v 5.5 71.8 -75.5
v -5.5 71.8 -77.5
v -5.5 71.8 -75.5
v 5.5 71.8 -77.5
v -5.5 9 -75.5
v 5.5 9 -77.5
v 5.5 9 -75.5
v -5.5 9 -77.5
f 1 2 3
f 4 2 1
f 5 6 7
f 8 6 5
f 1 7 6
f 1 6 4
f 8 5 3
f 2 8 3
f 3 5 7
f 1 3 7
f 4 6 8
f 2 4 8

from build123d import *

# Parameters (mm, degrees)
SKETCH1_W                       = 39
SKETCH1_H                       = 155
BOSS_EXTRUDE1_DEPTH             = 2
BOSS_EXTRUDE2_DEPTH             = 78
SKETCH3_W                       = 2
SKETCH3_H                       = 2
BOSS_EXTRUDE3_DEPTH             = 78
SKETCH4_W                       = 2
SKETCH4_H                       = 2
BOSS_EXTRUDE4_DEPTH             = 151
SKETCH6_W                       = 35
SKETCH6_H                       = 2.2
CUT_EXTRUDE1_DEPTH              = 174.750539568
SKETCH7_W                       = 35
SKETCH7_H                       = 2.2
CUT_EXTRUDE2_DEPTH              = 112.671392935
SKETCH5_W                       = 31
SKETCH5_H                       = 2
BOSS_EXTRUDE5_DEPTH             = 2
BOSS_EXTRUDE6_REACH             = 115.077
SKETCH8_W                       = 2
SKETCH8_H                       = 2
BOSS_EXTRUDE6_DIRECTION_2_REACH = 115.077
SKETCH10_W                      = 2
SKETCH10_H                      = 2.2
SKETCH10_W_2                    = 2.2
SKETCH10_H_2                    = 2
BOSS_EXTRUDE8_DEPTH             = 2
SKETCH11_W                      = 2
SKETCH11_H                      = 2.2
SKETCH11_W_2                    = 2.2
SKETCH11_H_2                    = 2
BOSS_EXTRUDE9_DEPTH             = 2
FILLET2_R                       = 2.5
SKETCH14_W                      = 36.5
SKETCH14_H                      = 7.75
BOSS_EXTRUDE10_DEPTH            = 2
SKETCH13_W                      = 31
SKETCH13_H                      = 3
CUT_EXTRUDE4_DEPTH              = 2
FILLET3_R                       = 2
FILLET4_R                       = 0.5
SKETCH15_R                      = 5.1
CUT_EXTRUDE5_DEPTH              = 114.077407116
SKETCH16_R                      = 7.1
BOSS_EXTRUDE11_DEPTH            = 1
FILLET5_R                       = 0.5
FILLET7_R                       = 0.5
CUT_EXTRUDE7_DEPTH              = 114.077407116
CUT_EXTRUDE7_DEPTH_BACK         = 114.077407116
SKETCH18_W                      = 9
SKETCH18_H                      = 71
CUT_EXTRUDE8_DEPTH              = 113.323194399
CUT_EXTRUDE9_DEPTH              = 81.213776872
CUT_EXTRUDE9_DEPTH_BACK         = 81.213776872
SKETCH19_W                      = 11
SKETCH19_H                      = 8.2


with BuildPart() as part:
    # Sketch1 → Boss-Extrude1 (new body)
    with BuildSketch(Plane(origin=(0, 0, 0), x_dir=(1, 0, 0), z_dir=(0, 1, 0))):
        Rectangle(SKETCH1_W, SKETCH1_H)
    extrude(amount=BOSS_EXTRUDE1_DEPTH)

    # Sketch2 → Boss-Extrude2 (add)
    with BuildSketch(Plane(origin=(0, 2, 0), x_dir=(1, 0, 0), z_dir=(0, 1, 0))):
        Polygon((-17.5, -77.5), (-17.5, -75.5), (-17.5, 75.5), (17.5, 75.5), (17.5, -75.5), (17.5, -77.5), (19.5, -77.5), (19.5, 77.5), (-19.5, 77.5), (-19.5, -77.5), align=None)
    extrude(amount=BOSS_EXTRUDE2_DEPTH)

    # Sketch3 → Boss-Extrude3 (add)
    with BuildSketch(Plane(origin=(0, 2, 0), x_dir=(1, 0, 0), z_dir=(0, 1, 0))):
        with Locations((-16.5, -76.5)):
            Rectangle(SKETCH3_W, SKETCH3_H)
        with Locations((-16.5, -72.3)):
            Rectangle(SKETCH3_W, SKETCH3_H)
        with Locations((16.5, -76.5)):
            Rectangle(SKETCH3_W, SKETCH3_H)
        with Locations((16.5, -72.3)):
            Rectangle(SKETCH3_W, SKETCH3_H)
    extrude(amount=BOSS_EXTRUDE3_DEPTH)

    # Sketch4 → Boss-Extrude4 (add)
    with BuildSketch(Plane.XY.offset(-75.5)):
        with Locations((-16.5, 79)):
            Rectangle(SKETCH4_W, SKETCH4_H)
        Polygon((-15.5, 73.8), (-17.5, 71.8), (-17.5, 75.8), (-15.5, 75.8), align=None)
        Polygon((15.5, 75.8), (17.5, 75.8), (17.5, 71.8), (15.5, 73.8), align=None)
        with Locations((16.5, 79)):
            Rectangle(SKETCH4_W, SKETCH4_H)
    extrude(amount=BOSS_EXTRUDE4_DEPTH)

    # Sketch6 → Cut-Extrude1 (cut, through all)
    with BuildSketch(Plane.XY.offset(-75.5)):
        with Locations((0, 76.9)):
            Rectangle(SKETCH6_W, SKETCH6_H)
    extrude(amount=CUT_EXTRUDE1_DEPTH, mode=Mode.SUBTRACT)

    # Sketch7 → Cut-Extrude2 (cut, through all)
    with BuildSketch(Plane(origin=(0, 2, 0), x_dir=(1, 0, 0), z_dir=(0, 1, 0))):
        with Locations((0, -74.4)):
            Rectangle(SKETCH7_W, SKETCH7_H)
    extrude(amount=CUT_EXTRUDE2_DEPTH, mode=Mode.SUBTRACT)

    # Sketch5 → Boss-Extrude5 (add)
    with BuildSketch(Plane(origin=(0, 2, 0), x_dir=(1, 0, 0), z_dir=(0, 1, 0))):
        with Locations((0, -76.5)):
            Rectangle(SKETCH5_W, SKETCH5_H)
        with Locations((0, -72.3)):
            Rectangle(SKETCH5_W, SKETCH5_H)
    extrude(amount=BOSS_EXTRUDE5_DEPTH)

    # Boss-Extrude6: up to this face of the body (flat: up to its plane)
    boss_extrude6_end = Plane(part.part.faces().sort_by_distance((17.5, 36.9, -2.1))[0])
    # Sketch8 → Boss-Extrude6 (add, up to the picked face)
    with BuildSketch(Plane(origin=(0, 0, 0), x_dir=(0, 0, -1), z_dir=(1, 0, 0)), mode=Mode.PRIVATE) as boss_extrude6_sk1:
        with Locations((74.5, 79)):
            Rectangle(SKETCH8_W, SKETCH8_H)
    boss_extrude6_tool1 = split(extrude(boss_extrude6_sk1.sketch, amount=BOSS_EXTRUDE6_REACH, mode=Mode.PRIVATE), bisect_by=boss_extrude6_end, keep=Keep.BOTH, mode=Mode.PRIVATE)
    # Sketch8 → Boss-Extrude6 (add, up to the picked face)
    with BuildSketch(Plane(origin=(0, 0, 0), x_dir=(0, 0, -1), z_dir=(1, 0, 0)), mode=Mode.PRIVATE) as boss_extrude6_sk2:
        Polygon((75.5, 75.8), (73.5, 75.8), (73.5, 73.8), (75.5, 71.8), align=None)
    boss_extrude6_tool2 = split(extrude(boss_extrude6_sk2.sketch, amount=BOSS_EXTRUDE6_REACH, mode=Mode.PRIVATE), bisect_by=boss_extrude6_end, keep=Keep.BOTH, mode=Mode.PRIVATE)
    add(boss_extrude6_tool1.solids().sort_by(Axis((0, 79, -74.5), (1, 0, 0)))[0])
    add(boss_extrude6_tool2.solids().sort_by(Axis((0, 74.244444, -74.611111), (1, 0, 0)))[0])

    # Boss-Extrude6 direction 2: up to this face of the body (flat: up to its plane)
    boss_extrude6_direction_2_end = Plane(part.part.faces().sort_by_distance((-17.5, 36.9, -2.1))[0])
    # Sketch8 → Boss-Extrude6 direction 2 (add, up to the picked face)
    with BuildSketch(Plane(origin=(0, 0, 0), x_dir=(0, 0, -1), z_dir=(1, 0, 0)), mode=Mode.PRIVATE) as boss_extrude6_direction_2_sk1:
        with Locations((74.5, 79)):
            Rectangle(SKETCH8_W, SKETCH8_H)
    boss_extrude6_direction_2_tool1 = split(extrude(boss_extrude6_direction_2_sk1.sketch, amount=-BOSS_EXTRUDE6_DIRECTION_2_REACH, mode=Mode.PRIVATE), bisect_by=boss_extrude6_direction_2_end, keep=Keep.BOTH, mode=Mode.PRIVATE)
    # Sketch8 → Boss-Extrude6 direction 2 (add, up to the picked face)
    with BuildSketch(Plane(origin=(0, 0, 0), x_dir=(0, 0, -1), z_dir=(1, 0, 0)), mode=Mode.PRIVATE) as boss_extrude6_direction_2_sk2:
        Polygon((75.5, 75.8), (73.5, 75.8), (73.5, 73.8), (75.5, 71.8), align=None)
    boss_extrude6_direction_2_tool2 = split(extrude(boss_extrude6_direction_2_sk2.sketch, amount=-BOSS_EXTRUDE6_DIRECTION_2_REACH, mode=Mode.PRIVATE), bisect_by=boss_extrude6_direction_2_end, keep=Keep.BOTH, mode=Mode.PRIVATE)
    add(boss_extrude6_direction_2_tool1.solids().sort_by(Axis((0, 79, -74.5), (-1, 0, 0)))[0])
    add(boss_extrude6_direction_2_tool2.solids().sort_by(Axis((0, 74.244444, -74.611111), (-1, 0, 0)))[0])

    # Sketch10 → Boss-Extrude8 (add)
    with BuildSketch(Plane(origin=(-17.5, 0, 0), x_dir=(0, 0, -1), z_dir=(1, 0, 0))):
        with Locations((-76.5, 76.9)):
            Rectangle(SKETCH10_W, SKETCH10_H)
        with Locations((-74.4, 79)):
            Rectangle(SKETCH10_W_2, SKETCH10_H_2)
    extrude(amount=BOSS_EXTRUDE8_DEPTH)

    # Sketch11 → Boss-Extrude9 (add)
    with BuildSketch(Plane.ZY.offset(-17.5)):
        with Locations((76.5, 76.9)):
            Rectangle(SKETCH11_W, SKETCH11_H)
        with Locations((74.4, 79)):
            Rectangle(SKETCH11_W_2, SKETCH11_H_2)
    extrude(amount=BOSS_EXTRUDE9_DEPTH)

    # Fillet2
    fillet2_edges = [part.edges().sort_by_distance(p)[0] for p in [
        (-17.5, 36.9, 71.3),
        (17.5, 36.9, 71.3),
        (19.5, 40, 77.5),
        (-19.5, 40, 77.5),
        (-19.5, 40, -77.5),
        (-17.5, 36.9, -75.5),
        (17.5, 36.9, -75.5),
        (19.5, 40, -77.5),
        (19.5, 80, 0),
        (-19.5, 80, 0),
        (19.5, 0, 0),
        (-19.5, 0, 0),
        (0, 80, -77.5),
        (0, 0, 77.5),
        (0, 0, -77.5),
        (-17.5, 80, 77.5),
        (17.5, 80, 77.5),
    ]]
    fillet(fillet2_edges, radius=FILLET2_R)

    # Sketch14 → Boss-Extrude10 (add)
    with BuildSketch(Plane.XY.offset(-75.5)):
        with Locations((0, 5.125)):
            Rectangle(SKETCH14_W, SKETCH14_H)
    extrude(amount=BOSS_EXTRUDE10_DEPTH)

    # Sketch13 → Cut-Extrude4 (cut)
    with BuildSketch(Plane(origin=(0, 0, -77.5), x_dir=(-1, 0, 0), z_dir=(0, 0, -1))):
        with Locations((0, 5.5)):
            Rectangle(SKETCH13_W, SKETCH13_H)
    extrude(amount=-CUT_EXTRUDE4_DEPTH, mode=Mode.SUBTRACT)

    # Fillet3
    fillet3_edges = [part.edges().sort_by_distance(p)[0] for p in [
        (0, 9, -73.5),
    ]]
    fillet(fillet3_edges, radius=FILLET3_R - 0.0001)  # a hair under: the kernel refuses the full size

    # Fillet4
    fillet4_edges = [part.edges().sort_by_distance(p)[0] for p in [
        (15.5, 5.5, -75.5),
        (15.5, 4, -76.5),
        (0, 7, -75.5),
        (15.5, 7, -76.5),
        (-15.5, 5.5, -75.5),
        (-15.5, 7, -76.5),
        (0, 4, -75.5),
        (-15.5, 4, -76.5),
        (15.5, 5.5, -77.5),
        (0, 4, -77.5),
        (-15.5, 5.5, -77.5),
        (0, 7, -77.5),
    ]]
    fillet(fillet4_edges, radius=FILLET4_R)

    # Sketch15 → Cut-Extrude5 (cut, through all)
    with BuildSketch(Plane.XZ):
        with Locations(Location((0, 38.75, 0), (0, 0, 270))):
            Circle(SKETCH15_R)
        with Locations(Location((0, -38.75, 0), (0, 0, 270))):
            Circle(SKETCH15_R)
    extrude(amount=-CUT_EXTRUDE5_DEPTH, mode=Mode.SUBTRACT)

    # Sketch16 → Boss-Extrude11 (add)
    with BuildSketch(Plane(origin=(0, 2, 0), x_dir=(1, 0, 0), z_dir=(0, 1, 0))):
        with Locations(Location((0, 38.75, 0), (0, 0, 270))):
            Circle(SKETCH16_R)
        with Locations(Location((0, -38.75, 0), (0, 0, 270))):
            Circle(SKETCH16_R)
    extrude(amount=BOSS_EXTRUDE11_DEPTH)

    # Fillet5
    fillet5_edges = [part.edges().sort_by_distance(p)[0] for p in [
        (0, 2, -45.85),
        (0, 3, -45.85),
        (0, 2, 31.65),
        (0, 3, 31.65),
    ]]
    fillet(fillet5_edges, radius=FILLET5_R - 0.0001)  # a hair under: the kernel refuses the full size

    # Fillet7
    fillet7_edges = [part.edges().sort_by_distance(p)[0] for p in [
        (15.5, 80, 0.75),
        (0, 4, 77.5),
        (0, 80, -73.5),
        (-15.5, 80, 0.75),
        (-15.5, 40.75, 77.5),
        (-15.5, 79.267766953, 76.767766953),
        (15.5, 40.75, 77.5),
        (15.5, 79.267766953, 76.767766953),
    ]]
    fillet(fillet7_edges, radius=FILLET7_R)

    # Sketch17 → Cut-Extrude7 (cut, two sides: drawn at the far end of the back side and taken through both)
    with BuildSketch(Plane.XY.offset(-CUT_EXTRUDE7_DEPTH_BACK)):
        Polygon((19.5, 80), (14.5, 80), (14.5, 9), (0, 9), (0, 0), (19.5, 0), align=None)
        Polygon((-14.5, 9), (-14.5, 80), (-19.5, 80), (-19.5, 0), (0, 0), (0, 9), align=None)
    extrude(amount=CUT_EXTRUDE7_DEPTH + CUT_EXTRUDE7_DEPTH_BACK, mode=Mode.SUBTRACT)

    # Sketch18 → Cut-Extrude8 (cut, through all)
    with BuildSketch(Plane.XY):
        with Locations((10, 44.5)):
            Rectangle(SKETCH18_W, SKETCH18_H)
        with Locations((-10, 44.5)):
            Rectangle(SKETCH18_W, SKETCH18_H)
    extrude(amount=-CUT_EXTRUDE8_DEPTH, mode=Mode.SUBTRACT)

    # Sketch19 → Cut-Extrude9 (cut, two sides: drawn at the far end of the back side and taken through both)
    with BuildSketch(Plane.XY.offset(-75.5).offset(-CUT_EXTRUDE9_DEPTH_BACK)):
        with Locations((0, 75.9)):
            Rectangle(SKETCH19_W, SKETCH19_H)
    extrude(amount=CUT_EXTRUDE9_DEPTH + CUT_EXTRUDE9_DEPTH_BACK, mode=Mode.SUBTRACT)


solid = part.part
